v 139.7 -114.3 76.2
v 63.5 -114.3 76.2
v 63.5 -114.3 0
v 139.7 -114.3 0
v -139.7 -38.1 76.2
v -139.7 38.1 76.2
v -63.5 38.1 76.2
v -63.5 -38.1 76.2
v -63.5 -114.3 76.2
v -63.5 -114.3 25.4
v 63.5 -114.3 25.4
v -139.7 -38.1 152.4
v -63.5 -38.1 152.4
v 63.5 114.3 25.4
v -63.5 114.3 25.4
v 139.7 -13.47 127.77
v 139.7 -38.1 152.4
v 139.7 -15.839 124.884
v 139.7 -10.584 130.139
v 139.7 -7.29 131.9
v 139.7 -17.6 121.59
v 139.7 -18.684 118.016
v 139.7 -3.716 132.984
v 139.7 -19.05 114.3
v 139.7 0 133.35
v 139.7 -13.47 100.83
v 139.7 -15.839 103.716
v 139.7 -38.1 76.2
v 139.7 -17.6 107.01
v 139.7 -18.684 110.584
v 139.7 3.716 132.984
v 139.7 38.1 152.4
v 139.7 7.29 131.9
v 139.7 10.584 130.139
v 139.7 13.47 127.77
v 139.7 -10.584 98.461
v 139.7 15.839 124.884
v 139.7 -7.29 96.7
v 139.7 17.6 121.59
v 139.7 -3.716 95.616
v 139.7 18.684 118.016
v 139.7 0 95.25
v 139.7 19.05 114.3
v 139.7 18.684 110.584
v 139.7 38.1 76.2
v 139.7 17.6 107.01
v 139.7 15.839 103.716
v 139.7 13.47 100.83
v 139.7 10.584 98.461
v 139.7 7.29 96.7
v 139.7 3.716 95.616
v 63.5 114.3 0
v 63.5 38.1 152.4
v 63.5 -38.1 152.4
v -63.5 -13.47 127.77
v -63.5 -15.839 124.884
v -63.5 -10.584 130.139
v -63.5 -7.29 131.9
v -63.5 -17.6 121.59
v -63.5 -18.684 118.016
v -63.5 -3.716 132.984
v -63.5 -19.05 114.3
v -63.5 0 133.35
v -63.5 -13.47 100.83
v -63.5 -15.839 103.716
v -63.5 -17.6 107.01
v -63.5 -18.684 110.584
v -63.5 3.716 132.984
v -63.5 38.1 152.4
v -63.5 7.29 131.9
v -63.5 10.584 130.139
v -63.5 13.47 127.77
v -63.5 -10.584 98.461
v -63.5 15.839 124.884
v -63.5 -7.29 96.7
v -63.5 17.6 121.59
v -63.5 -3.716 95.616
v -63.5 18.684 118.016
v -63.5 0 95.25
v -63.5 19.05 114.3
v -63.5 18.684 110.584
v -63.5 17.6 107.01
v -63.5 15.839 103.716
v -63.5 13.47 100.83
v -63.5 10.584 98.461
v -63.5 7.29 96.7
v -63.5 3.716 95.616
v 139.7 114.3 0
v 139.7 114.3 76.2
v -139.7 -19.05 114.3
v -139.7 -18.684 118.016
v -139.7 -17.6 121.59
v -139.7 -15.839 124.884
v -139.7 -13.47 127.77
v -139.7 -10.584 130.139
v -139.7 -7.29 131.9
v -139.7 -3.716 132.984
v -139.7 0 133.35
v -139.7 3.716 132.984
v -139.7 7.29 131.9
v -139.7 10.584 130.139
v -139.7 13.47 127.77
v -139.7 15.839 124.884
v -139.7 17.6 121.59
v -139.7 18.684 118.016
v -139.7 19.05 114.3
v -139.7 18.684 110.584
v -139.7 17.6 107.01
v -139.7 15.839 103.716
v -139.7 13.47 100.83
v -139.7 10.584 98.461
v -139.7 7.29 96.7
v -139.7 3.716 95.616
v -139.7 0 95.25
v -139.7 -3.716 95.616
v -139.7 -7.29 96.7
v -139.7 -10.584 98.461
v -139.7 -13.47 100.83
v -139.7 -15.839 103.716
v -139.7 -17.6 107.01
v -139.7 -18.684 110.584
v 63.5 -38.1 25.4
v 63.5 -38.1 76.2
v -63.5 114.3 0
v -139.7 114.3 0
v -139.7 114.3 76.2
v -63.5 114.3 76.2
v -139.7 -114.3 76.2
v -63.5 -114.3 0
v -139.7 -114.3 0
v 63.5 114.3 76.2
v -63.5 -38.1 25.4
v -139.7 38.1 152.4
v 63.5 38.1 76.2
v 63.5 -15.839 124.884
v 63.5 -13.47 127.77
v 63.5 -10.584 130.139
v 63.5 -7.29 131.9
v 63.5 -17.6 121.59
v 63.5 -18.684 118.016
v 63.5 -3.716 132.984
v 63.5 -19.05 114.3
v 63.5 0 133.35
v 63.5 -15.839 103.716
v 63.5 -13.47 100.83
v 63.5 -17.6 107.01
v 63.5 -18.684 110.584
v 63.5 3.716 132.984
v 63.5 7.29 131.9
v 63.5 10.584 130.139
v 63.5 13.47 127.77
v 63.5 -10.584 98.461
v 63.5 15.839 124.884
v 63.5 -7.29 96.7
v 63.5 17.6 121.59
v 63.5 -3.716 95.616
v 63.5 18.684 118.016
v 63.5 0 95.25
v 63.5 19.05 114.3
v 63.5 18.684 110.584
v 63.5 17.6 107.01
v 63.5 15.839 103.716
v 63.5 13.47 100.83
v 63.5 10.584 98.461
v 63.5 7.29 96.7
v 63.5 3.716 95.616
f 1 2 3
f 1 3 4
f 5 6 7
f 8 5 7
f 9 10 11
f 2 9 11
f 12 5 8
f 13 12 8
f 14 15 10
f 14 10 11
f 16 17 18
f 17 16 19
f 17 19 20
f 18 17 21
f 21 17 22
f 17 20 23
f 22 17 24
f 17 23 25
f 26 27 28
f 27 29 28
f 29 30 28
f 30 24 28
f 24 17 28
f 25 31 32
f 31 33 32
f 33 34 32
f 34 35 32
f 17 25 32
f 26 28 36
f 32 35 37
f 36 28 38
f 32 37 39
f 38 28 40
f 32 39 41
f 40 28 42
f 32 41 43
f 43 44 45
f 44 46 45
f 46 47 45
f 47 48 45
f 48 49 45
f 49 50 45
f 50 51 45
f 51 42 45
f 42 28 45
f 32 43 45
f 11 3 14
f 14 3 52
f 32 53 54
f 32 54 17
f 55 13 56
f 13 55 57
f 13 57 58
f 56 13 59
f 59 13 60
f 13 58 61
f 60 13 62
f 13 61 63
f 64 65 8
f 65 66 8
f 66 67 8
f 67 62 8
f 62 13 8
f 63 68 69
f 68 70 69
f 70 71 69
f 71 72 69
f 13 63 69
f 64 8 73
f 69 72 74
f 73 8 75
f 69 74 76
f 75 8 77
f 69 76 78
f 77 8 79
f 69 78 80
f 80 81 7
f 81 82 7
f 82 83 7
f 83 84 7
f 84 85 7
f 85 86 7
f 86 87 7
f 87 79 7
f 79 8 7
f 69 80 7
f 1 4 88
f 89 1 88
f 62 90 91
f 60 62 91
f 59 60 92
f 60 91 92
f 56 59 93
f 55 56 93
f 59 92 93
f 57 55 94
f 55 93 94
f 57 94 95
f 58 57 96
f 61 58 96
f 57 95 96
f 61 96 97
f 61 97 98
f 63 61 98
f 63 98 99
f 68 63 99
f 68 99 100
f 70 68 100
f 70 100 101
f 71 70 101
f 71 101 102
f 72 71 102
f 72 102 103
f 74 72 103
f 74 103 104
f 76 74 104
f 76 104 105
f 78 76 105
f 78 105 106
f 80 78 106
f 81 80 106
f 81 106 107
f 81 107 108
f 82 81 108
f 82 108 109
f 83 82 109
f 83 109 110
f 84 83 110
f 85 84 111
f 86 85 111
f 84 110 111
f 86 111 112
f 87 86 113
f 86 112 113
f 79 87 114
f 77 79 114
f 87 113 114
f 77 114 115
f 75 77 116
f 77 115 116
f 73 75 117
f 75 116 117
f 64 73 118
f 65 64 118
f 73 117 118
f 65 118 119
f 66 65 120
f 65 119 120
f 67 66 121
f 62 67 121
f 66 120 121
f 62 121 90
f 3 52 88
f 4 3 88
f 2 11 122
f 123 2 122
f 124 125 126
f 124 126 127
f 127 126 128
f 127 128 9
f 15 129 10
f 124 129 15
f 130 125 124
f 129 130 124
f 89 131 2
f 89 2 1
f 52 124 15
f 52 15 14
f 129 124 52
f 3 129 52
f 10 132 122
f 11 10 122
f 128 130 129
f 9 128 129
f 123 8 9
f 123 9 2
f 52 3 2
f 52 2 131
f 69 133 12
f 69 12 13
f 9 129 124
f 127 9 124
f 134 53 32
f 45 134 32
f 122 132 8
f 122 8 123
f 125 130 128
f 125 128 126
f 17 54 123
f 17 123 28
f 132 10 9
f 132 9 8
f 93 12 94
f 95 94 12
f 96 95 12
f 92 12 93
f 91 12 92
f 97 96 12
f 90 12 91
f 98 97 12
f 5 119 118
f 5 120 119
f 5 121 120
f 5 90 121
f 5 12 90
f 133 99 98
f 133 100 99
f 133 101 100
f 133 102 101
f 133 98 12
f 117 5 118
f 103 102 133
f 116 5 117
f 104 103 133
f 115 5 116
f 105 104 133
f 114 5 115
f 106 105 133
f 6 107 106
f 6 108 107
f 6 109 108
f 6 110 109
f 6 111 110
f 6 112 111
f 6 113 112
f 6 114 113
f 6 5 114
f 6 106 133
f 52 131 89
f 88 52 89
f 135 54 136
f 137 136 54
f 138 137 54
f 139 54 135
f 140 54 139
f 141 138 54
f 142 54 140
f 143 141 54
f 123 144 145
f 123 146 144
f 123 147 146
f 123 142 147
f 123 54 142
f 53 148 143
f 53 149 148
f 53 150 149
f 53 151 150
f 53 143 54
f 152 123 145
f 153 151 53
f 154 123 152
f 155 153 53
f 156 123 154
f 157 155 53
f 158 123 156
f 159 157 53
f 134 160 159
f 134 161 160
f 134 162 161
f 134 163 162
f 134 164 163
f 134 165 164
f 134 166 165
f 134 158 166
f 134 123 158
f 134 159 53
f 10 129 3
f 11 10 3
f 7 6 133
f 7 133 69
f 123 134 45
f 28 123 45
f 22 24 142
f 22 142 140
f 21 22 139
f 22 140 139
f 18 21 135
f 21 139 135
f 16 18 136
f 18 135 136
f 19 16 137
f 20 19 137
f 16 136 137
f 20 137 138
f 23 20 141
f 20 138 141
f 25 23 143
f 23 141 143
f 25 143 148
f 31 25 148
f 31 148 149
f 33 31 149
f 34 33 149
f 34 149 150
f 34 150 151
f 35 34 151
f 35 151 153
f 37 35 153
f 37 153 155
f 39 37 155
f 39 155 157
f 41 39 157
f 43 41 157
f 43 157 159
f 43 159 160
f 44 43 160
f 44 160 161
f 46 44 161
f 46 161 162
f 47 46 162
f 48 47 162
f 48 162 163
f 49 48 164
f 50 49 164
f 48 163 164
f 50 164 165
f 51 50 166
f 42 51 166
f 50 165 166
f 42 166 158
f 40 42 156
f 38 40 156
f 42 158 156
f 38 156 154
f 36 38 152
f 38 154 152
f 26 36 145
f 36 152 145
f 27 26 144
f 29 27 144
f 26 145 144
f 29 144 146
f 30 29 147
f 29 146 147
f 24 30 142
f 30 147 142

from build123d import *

# Parameters (mm, degrees)
F0_W     = 76.2
F0_H     = 228.6
F1_DEPTH = 76.2
F0_W_2   = 127
F2_DEPTH = 25.4
F3_W     = 127
F3_H     = 76.2
F4_DEPTH = 50.8
F5_W     = 76.2
F5_H     = 76.2
F6_W     = 76.2
F6_H     = 76.2
F7_DEPTH = 76.2
F9_D     = 38.1


with BuildPart() as f1:
    # F0 (on Top) → F1 (new body)
    with BuildSketch(Plane.XY):
        with Locations((-101.6, 0)):
            Rectangle(F0_W, F0_H)
        with Locations((101.6, 0)):
            Rectangle(F0_W, F0_H)
    extrude(amount=F1_DEPTH)


with BuildPart() as f2:
    # F0 (on Top) → F2 (new body)
    with BuildSketch(Plane.XY):
        Rectangle(F0_W_2, F0_H)
    extrude(amount=F2_DEPTH)


with BuildPart() as f4:
    # F3 (on face) → F4 (new body)
    with BuildSketch(Plane.XY.offset(25.4)):
        with Locations((0, -76.2)):
            Rectangle(F3_W, F3_H)
    extrude(amount=F4_DEPTH)


with BuildPart() as f7:
    # F5 (on face) + F6 (on face) → F7 (new body)
    with BuildSketch(Plane.XY.offset(76.2)):
        with Locations((-101.6, 0)):
            Rectangle(F5_W, F5_H)
    with BuildSketch(Plane.XY.offset(76.2)):
        with Locations((101.6, 0)):
            Rectangle(F6_W, F6_H)
    extrude(amount=F7_DEPTH)

    # F9 (through all)
    with Locations(Plane.YZ.offset(139.7)):
        with Locations((0, 114.3)):
            Hole(F9_D / 2)


solid = Compound([f1.part, f2.part, f4.part, f7.part])
